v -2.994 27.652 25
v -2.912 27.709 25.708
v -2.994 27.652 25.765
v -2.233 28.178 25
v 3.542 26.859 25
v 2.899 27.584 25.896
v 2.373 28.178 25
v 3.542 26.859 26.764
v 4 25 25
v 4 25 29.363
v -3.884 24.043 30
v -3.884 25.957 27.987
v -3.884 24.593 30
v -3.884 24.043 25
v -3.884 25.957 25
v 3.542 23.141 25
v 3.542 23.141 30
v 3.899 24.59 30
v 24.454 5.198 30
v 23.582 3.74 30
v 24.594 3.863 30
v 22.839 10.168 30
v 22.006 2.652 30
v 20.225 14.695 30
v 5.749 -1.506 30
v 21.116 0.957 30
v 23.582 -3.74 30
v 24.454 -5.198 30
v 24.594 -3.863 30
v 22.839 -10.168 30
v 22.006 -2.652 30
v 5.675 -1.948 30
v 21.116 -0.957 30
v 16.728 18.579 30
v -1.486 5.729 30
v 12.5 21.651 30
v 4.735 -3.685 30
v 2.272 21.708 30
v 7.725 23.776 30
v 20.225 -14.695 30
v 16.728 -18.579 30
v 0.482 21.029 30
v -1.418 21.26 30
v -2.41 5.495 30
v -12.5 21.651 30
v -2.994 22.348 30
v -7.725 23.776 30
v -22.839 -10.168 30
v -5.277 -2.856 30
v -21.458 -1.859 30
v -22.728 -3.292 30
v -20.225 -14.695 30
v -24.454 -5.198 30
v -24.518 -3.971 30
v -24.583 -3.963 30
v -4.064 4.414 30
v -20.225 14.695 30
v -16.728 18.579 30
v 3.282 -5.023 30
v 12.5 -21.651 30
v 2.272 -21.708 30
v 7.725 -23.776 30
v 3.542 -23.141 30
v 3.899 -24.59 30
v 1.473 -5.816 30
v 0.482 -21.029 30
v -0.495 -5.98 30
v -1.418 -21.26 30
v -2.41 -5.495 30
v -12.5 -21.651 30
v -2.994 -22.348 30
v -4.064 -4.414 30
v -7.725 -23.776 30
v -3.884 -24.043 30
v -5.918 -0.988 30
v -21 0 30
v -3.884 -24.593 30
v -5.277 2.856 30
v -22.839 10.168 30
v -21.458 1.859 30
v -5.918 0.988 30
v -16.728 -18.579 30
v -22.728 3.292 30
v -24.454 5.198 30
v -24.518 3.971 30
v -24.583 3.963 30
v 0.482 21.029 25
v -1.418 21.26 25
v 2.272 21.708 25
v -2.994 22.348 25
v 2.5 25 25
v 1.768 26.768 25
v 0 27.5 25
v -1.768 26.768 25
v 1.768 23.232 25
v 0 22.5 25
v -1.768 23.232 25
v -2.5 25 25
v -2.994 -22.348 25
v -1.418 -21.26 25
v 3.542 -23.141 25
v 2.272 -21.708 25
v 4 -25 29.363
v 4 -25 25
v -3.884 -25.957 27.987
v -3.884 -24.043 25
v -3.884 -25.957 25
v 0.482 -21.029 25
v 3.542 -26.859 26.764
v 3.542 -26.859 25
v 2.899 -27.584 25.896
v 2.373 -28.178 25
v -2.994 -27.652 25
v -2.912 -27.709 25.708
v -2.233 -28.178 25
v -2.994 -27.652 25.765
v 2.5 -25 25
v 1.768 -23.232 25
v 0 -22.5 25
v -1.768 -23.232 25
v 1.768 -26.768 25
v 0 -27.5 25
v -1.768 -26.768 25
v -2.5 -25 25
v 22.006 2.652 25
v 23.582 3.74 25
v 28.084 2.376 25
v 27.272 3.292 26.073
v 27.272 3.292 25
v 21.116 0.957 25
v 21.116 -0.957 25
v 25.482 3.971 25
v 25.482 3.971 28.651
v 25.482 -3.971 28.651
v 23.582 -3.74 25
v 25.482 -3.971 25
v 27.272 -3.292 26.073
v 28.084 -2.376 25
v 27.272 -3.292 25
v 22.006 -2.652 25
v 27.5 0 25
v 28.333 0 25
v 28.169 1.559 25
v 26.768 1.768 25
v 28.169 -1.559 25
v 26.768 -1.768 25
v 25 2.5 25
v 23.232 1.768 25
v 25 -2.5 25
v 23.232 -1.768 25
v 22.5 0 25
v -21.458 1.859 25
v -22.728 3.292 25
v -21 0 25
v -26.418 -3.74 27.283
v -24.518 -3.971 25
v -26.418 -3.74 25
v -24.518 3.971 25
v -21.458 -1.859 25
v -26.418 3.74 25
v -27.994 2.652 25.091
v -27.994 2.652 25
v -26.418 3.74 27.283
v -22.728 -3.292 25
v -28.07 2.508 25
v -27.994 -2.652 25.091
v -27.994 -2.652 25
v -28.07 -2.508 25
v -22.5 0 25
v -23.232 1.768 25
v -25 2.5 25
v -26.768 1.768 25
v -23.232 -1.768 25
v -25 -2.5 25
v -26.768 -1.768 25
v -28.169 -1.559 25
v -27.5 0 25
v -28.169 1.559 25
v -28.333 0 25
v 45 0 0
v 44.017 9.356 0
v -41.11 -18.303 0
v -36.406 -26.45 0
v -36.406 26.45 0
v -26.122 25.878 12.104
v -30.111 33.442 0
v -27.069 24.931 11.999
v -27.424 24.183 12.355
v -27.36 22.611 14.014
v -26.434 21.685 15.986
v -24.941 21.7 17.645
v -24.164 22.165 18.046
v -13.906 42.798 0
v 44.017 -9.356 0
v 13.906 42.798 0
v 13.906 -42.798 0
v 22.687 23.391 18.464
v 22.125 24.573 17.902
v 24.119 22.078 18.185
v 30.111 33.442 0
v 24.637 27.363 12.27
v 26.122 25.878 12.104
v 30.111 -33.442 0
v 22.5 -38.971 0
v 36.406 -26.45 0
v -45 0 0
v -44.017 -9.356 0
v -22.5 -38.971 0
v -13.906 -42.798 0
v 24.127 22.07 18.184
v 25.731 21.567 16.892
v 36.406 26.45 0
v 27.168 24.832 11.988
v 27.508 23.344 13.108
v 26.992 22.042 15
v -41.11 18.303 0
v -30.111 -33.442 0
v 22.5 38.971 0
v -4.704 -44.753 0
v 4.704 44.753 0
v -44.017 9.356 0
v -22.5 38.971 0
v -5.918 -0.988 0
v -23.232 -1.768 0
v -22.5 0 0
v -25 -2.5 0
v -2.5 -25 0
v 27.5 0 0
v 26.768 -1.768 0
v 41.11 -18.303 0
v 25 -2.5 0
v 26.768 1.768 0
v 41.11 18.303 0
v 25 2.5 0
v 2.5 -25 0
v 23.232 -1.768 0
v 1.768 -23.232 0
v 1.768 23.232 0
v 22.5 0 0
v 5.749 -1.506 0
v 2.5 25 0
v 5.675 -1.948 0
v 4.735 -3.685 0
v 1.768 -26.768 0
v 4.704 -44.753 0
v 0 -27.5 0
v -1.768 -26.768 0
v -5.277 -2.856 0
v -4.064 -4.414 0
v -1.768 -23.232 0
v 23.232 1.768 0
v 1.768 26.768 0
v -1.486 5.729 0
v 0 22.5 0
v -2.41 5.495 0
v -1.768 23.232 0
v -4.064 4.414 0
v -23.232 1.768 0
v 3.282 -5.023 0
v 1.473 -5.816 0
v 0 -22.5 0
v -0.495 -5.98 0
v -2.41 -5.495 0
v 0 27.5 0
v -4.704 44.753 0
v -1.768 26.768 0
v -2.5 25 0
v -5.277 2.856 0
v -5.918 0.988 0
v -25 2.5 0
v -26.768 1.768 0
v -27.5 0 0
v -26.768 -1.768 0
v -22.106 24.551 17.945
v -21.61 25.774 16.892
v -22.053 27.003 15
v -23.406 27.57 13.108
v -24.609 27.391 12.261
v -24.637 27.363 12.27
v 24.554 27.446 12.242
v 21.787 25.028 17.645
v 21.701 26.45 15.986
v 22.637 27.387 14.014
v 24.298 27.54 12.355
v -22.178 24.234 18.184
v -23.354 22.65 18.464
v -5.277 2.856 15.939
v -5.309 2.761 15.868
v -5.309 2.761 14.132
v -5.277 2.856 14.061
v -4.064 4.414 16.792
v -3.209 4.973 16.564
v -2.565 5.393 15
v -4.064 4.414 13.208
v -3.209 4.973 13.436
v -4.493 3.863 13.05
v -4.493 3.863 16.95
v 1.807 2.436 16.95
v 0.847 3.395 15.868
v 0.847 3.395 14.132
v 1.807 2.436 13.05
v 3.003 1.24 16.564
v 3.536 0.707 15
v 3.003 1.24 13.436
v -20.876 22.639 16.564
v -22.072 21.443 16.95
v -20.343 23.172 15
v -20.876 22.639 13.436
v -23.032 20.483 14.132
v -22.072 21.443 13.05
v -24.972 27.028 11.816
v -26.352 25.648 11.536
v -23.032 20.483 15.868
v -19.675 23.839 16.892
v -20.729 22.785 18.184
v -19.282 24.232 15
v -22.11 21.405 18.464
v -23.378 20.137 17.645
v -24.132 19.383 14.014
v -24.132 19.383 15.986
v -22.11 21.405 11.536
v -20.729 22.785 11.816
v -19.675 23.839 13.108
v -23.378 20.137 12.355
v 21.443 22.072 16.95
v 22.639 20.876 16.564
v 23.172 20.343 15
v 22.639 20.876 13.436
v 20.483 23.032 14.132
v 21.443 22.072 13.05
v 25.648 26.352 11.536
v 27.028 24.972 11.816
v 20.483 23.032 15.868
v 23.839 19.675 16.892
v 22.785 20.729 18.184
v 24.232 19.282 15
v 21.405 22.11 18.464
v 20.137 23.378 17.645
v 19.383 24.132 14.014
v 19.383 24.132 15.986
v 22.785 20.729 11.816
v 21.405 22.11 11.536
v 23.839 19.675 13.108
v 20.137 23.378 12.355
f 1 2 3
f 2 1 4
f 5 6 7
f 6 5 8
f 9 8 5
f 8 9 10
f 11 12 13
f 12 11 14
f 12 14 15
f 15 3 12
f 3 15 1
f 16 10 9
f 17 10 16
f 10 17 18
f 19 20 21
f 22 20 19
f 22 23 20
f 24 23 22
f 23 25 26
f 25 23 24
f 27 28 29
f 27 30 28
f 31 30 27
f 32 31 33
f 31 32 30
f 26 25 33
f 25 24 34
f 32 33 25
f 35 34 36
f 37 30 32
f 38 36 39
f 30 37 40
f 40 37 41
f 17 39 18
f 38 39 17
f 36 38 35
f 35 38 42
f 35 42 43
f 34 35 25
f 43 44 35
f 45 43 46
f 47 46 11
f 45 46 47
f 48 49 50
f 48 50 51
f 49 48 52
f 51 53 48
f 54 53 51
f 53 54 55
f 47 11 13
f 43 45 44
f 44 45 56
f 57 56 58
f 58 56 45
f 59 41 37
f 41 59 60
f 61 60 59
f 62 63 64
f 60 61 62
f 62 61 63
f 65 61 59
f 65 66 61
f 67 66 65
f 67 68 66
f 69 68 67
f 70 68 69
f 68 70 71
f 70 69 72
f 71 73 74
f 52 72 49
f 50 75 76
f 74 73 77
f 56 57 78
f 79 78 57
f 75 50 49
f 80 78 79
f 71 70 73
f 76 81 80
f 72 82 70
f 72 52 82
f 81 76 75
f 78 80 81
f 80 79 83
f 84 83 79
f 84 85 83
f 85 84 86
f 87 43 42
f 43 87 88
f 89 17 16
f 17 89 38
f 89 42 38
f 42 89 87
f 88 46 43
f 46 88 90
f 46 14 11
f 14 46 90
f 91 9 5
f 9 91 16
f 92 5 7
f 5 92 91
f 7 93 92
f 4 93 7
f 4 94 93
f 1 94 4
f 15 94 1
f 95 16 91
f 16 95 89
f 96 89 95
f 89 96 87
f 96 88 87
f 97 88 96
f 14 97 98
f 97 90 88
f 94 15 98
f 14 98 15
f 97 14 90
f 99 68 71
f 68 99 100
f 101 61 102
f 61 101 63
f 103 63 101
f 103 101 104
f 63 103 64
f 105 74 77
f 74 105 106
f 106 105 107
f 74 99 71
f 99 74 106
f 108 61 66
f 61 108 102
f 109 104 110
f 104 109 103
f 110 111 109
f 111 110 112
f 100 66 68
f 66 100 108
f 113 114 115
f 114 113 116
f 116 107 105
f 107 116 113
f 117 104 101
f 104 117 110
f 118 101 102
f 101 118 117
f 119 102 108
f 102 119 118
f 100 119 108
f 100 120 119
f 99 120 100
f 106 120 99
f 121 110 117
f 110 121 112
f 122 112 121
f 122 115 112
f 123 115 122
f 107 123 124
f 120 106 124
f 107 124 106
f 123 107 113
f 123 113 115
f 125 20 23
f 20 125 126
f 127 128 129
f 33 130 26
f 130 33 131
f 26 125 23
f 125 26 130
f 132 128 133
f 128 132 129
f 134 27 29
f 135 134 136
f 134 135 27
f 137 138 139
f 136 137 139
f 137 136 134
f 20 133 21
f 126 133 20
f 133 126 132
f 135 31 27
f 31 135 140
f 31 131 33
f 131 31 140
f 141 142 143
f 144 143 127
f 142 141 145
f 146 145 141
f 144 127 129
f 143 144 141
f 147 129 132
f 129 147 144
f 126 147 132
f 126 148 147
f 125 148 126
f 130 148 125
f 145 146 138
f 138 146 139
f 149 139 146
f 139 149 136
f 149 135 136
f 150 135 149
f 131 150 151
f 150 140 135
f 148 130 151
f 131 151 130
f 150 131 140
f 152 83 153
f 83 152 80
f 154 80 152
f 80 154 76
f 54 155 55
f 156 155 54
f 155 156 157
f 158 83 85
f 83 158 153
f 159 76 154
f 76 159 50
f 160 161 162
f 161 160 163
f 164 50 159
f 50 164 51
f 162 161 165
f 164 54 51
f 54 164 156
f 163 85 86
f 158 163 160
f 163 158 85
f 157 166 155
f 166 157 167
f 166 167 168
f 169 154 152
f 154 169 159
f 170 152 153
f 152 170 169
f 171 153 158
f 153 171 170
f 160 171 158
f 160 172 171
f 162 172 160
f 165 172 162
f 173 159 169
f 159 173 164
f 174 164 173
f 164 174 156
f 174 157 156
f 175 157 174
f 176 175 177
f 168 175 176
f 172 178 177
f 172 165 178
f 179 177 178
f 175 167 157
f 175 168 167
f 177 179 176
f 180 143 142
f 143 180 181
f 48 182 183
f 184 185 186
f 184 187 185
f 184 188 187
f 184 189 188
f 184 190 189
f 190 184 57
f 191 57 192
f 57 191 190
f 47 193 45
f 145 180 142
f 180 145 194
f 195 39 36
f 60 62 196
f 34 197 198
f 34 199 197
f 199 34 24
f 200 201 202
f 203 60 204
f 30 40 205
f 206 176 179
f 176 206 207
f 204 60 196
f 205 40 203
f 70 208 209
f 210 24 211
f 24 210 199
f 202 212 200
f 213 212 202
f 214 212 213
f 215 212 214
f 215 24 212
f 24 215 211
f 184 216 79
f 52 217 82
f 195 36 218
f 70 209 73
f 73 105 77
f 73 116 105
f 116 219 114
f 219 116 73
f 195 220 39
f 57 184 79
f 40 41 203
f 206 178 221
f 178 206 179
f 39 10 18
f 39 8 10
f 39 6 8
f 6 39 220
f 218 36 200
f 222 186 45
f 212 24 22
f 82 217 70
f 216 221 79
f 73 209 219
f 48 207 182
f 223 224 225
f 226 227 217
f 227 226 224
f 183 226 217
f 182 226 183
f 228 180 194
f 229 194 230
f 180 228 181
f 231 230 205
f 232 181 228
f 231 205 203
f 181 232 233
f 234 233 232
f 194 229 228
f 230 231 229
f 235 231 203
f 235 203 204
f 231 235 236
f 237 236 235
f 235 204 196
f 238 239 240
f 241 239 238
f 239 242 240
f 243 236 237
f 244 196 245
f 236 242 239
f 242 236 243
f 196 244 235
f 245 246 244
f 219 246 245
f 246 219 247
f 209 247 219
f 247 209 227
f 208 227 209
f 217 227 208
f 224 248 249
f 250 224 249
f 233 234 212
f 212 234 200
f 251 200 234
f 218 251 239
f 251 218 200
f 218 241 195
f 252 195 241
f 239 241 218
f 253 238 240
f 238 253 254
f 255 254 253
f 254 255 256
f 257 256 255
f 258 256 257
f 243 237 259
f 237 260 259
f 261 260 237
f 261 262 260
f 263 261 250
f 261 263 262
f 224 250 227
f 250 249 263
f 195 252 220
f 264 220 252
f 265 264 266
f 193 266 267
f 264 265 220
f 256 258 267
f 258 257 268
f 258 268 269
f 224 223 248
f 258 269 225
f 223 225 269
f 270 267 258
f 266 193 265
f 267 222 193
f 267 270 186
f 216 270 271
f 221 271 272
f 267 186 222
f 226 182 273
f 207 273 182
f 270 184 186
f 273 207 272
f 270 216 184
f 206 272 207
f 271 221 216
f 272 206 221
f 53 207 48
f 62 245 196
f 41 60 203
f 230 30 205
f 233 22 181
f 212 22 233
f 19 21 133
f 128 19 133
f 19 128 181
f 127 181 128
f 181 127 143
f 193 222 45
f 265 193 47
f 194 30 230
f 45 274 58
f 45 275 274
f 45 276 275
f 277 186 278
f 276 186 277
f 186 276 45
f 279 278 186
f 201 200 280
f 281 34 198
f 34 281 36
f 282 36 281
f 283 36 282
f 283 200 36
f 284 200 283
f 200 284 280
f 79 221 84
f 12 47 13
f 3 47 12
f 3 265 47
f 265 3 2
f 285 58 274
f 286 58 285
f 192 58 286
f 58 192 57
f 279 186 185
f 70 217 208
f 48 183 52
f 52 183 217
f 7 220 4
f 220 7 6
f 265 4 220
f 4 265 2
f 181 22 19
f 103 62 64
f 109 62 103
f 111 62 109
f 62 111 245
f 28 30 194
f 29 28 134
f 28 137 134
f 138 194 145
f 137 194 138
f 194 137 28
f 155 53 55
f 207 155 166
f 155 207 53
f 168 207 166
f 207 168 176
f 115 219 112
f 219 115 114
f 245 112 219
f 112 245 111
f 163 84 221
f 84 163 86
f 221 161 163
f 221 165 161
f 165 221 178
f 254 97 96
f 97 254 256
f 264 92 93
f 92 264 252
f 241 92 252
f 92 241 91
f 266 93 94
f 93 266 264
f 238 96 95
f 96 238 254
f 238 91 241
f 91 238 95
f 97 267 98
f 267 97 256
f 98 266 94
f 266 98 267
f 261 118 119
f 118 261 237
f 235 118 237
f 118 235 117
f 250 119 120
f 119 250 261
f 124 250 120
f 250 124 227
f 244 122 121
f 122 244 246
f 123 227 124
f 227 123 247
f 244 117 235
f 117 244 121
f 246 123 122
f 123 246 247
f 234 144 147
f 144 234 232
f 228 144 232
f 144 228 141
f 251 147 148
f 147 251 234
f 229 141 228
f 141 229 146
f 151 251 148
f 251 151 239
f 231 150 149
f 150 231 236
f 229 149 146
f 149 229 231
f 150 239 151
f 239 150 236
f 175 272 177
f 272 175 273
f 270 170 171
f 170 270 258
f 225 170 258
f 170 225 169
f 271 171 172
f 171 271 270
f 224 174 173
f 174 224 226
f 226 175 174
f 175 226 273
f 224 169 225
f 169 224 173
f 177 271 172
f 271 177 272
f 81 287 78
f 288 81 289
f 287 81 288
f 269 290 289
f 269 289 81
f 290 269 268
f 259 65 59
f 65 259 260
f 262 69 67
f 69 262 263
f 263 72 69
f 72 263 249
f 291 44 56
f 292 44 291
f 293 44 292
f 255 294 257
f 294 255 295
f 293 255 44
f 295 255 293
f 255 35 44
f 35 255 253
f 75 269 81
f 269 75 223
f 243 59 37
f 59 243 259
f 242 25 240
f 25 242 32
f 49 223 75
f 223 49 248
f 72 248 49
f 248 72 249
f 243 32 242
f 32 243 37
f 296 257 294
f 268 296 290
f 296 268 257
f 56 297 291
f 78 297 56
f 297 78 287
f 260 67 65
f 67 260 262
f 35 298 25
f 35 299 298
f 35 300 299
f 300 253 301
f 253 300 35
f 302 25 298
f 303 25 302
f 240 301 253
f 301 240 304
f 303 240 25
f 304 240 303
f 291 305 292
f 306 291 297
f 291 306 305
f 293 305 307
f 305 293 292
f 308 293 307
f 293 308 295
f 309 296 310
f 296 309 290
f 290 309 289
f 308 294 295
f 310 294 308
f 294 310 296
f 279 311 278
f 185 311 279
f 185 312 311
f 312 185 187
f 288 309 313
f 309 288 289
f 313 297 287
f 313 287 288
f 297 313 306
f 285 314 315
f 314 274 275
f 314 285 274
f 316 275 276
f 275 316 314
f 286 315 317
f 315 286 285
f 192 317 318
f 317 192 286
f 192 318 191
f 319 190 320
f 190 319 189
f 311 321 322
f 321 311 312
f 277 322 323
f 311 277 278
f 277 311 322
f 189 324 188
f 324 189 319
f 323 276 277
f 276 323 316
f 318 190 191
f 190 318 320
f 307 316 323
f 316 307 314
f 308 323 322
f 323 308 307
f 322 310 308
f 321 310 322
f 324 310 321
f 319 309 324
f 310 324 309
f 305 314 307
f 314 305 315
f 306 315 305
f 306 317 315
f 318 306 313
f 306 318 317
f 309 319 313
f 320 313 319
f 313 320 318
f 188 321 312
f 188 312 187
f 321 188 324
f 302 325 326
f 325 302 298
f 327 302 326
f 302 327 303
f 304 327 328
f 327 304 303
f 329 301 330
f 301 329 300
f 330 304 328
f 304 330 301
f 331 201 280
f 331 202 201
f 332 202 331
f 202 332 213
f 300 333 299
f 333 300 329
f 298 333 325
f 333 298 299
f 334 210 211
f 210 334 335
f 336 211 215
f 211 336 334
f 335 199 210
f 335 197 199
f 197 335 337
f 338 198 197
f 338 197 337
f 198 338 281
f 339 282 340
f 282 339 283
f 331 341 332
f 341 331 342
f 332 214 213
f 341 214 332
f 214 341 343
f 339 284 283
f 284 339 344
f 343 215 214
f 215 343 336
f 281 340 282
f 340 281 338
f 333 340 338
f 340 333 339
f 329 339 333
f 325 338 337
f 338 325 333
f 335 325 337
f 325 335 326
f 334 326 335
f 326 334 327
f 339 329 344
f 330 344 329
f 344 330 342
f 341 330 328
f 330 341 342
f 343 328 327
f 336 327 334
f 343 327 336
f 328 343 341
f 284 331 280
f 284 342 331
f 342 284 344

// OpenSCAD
/*todo: 
    - modifica gaurile de prindere sa se infileteze
*/
//$fn = 180;
holeRadius=25;
difference(){
    
    union(){
        difference(){
            cylinder(r1=45,r2=25,h=30);
            translate([0,holeRadius,0]){
                cylinder(r=2.5,h=30);
            }
            translate([0,-holeRadius,0]){
                cylinder(r=2.5,h=30);
            }
            translate([holeRadius,0,0]){
                cylinder(r=2.5,h=30);
            }
            translate([-holeRadius,0,0]){
                cylinder(r=2.5,h=30);
            }
            translate([0,0,25]){
                translate([0,holeRadius,0]){
                    cylinder(r=4,h=5);
                }
                translate([0,-holeRadius,0]){
                    cylinder(r=4,h=5);
                }
                translate([holeRadius,0,0]){
                    cylinder(r=4,h=5);
                }
                translate([-holeRadius,0,0]){
                    cylinder(r=4,h=5);
                }
            }
            cylinder(r=6,h=30);
            
            /*translate([30,30,15]){
                rotate([90,0,-45]){
    #                cylinder(r=2.5,h=40);
                }
            
            }*/
        }
        rotate([0,0,45]){
            translate([3,-6,0]){
               cube([3,12,30]);
            }
        }
    }
    translate([-26,26,15]){
        rotate([90,0,45]){
            cylinder(r=2,h=40);
            cylinder(r=3.5,h=6);
        }
        
    }
    translate([26,26,15]){
        rotate([90,0,-45]){
      #      cylinder(r=2,h=40);
            cylinder(r=3.5,h=6);
        }
    }
}
